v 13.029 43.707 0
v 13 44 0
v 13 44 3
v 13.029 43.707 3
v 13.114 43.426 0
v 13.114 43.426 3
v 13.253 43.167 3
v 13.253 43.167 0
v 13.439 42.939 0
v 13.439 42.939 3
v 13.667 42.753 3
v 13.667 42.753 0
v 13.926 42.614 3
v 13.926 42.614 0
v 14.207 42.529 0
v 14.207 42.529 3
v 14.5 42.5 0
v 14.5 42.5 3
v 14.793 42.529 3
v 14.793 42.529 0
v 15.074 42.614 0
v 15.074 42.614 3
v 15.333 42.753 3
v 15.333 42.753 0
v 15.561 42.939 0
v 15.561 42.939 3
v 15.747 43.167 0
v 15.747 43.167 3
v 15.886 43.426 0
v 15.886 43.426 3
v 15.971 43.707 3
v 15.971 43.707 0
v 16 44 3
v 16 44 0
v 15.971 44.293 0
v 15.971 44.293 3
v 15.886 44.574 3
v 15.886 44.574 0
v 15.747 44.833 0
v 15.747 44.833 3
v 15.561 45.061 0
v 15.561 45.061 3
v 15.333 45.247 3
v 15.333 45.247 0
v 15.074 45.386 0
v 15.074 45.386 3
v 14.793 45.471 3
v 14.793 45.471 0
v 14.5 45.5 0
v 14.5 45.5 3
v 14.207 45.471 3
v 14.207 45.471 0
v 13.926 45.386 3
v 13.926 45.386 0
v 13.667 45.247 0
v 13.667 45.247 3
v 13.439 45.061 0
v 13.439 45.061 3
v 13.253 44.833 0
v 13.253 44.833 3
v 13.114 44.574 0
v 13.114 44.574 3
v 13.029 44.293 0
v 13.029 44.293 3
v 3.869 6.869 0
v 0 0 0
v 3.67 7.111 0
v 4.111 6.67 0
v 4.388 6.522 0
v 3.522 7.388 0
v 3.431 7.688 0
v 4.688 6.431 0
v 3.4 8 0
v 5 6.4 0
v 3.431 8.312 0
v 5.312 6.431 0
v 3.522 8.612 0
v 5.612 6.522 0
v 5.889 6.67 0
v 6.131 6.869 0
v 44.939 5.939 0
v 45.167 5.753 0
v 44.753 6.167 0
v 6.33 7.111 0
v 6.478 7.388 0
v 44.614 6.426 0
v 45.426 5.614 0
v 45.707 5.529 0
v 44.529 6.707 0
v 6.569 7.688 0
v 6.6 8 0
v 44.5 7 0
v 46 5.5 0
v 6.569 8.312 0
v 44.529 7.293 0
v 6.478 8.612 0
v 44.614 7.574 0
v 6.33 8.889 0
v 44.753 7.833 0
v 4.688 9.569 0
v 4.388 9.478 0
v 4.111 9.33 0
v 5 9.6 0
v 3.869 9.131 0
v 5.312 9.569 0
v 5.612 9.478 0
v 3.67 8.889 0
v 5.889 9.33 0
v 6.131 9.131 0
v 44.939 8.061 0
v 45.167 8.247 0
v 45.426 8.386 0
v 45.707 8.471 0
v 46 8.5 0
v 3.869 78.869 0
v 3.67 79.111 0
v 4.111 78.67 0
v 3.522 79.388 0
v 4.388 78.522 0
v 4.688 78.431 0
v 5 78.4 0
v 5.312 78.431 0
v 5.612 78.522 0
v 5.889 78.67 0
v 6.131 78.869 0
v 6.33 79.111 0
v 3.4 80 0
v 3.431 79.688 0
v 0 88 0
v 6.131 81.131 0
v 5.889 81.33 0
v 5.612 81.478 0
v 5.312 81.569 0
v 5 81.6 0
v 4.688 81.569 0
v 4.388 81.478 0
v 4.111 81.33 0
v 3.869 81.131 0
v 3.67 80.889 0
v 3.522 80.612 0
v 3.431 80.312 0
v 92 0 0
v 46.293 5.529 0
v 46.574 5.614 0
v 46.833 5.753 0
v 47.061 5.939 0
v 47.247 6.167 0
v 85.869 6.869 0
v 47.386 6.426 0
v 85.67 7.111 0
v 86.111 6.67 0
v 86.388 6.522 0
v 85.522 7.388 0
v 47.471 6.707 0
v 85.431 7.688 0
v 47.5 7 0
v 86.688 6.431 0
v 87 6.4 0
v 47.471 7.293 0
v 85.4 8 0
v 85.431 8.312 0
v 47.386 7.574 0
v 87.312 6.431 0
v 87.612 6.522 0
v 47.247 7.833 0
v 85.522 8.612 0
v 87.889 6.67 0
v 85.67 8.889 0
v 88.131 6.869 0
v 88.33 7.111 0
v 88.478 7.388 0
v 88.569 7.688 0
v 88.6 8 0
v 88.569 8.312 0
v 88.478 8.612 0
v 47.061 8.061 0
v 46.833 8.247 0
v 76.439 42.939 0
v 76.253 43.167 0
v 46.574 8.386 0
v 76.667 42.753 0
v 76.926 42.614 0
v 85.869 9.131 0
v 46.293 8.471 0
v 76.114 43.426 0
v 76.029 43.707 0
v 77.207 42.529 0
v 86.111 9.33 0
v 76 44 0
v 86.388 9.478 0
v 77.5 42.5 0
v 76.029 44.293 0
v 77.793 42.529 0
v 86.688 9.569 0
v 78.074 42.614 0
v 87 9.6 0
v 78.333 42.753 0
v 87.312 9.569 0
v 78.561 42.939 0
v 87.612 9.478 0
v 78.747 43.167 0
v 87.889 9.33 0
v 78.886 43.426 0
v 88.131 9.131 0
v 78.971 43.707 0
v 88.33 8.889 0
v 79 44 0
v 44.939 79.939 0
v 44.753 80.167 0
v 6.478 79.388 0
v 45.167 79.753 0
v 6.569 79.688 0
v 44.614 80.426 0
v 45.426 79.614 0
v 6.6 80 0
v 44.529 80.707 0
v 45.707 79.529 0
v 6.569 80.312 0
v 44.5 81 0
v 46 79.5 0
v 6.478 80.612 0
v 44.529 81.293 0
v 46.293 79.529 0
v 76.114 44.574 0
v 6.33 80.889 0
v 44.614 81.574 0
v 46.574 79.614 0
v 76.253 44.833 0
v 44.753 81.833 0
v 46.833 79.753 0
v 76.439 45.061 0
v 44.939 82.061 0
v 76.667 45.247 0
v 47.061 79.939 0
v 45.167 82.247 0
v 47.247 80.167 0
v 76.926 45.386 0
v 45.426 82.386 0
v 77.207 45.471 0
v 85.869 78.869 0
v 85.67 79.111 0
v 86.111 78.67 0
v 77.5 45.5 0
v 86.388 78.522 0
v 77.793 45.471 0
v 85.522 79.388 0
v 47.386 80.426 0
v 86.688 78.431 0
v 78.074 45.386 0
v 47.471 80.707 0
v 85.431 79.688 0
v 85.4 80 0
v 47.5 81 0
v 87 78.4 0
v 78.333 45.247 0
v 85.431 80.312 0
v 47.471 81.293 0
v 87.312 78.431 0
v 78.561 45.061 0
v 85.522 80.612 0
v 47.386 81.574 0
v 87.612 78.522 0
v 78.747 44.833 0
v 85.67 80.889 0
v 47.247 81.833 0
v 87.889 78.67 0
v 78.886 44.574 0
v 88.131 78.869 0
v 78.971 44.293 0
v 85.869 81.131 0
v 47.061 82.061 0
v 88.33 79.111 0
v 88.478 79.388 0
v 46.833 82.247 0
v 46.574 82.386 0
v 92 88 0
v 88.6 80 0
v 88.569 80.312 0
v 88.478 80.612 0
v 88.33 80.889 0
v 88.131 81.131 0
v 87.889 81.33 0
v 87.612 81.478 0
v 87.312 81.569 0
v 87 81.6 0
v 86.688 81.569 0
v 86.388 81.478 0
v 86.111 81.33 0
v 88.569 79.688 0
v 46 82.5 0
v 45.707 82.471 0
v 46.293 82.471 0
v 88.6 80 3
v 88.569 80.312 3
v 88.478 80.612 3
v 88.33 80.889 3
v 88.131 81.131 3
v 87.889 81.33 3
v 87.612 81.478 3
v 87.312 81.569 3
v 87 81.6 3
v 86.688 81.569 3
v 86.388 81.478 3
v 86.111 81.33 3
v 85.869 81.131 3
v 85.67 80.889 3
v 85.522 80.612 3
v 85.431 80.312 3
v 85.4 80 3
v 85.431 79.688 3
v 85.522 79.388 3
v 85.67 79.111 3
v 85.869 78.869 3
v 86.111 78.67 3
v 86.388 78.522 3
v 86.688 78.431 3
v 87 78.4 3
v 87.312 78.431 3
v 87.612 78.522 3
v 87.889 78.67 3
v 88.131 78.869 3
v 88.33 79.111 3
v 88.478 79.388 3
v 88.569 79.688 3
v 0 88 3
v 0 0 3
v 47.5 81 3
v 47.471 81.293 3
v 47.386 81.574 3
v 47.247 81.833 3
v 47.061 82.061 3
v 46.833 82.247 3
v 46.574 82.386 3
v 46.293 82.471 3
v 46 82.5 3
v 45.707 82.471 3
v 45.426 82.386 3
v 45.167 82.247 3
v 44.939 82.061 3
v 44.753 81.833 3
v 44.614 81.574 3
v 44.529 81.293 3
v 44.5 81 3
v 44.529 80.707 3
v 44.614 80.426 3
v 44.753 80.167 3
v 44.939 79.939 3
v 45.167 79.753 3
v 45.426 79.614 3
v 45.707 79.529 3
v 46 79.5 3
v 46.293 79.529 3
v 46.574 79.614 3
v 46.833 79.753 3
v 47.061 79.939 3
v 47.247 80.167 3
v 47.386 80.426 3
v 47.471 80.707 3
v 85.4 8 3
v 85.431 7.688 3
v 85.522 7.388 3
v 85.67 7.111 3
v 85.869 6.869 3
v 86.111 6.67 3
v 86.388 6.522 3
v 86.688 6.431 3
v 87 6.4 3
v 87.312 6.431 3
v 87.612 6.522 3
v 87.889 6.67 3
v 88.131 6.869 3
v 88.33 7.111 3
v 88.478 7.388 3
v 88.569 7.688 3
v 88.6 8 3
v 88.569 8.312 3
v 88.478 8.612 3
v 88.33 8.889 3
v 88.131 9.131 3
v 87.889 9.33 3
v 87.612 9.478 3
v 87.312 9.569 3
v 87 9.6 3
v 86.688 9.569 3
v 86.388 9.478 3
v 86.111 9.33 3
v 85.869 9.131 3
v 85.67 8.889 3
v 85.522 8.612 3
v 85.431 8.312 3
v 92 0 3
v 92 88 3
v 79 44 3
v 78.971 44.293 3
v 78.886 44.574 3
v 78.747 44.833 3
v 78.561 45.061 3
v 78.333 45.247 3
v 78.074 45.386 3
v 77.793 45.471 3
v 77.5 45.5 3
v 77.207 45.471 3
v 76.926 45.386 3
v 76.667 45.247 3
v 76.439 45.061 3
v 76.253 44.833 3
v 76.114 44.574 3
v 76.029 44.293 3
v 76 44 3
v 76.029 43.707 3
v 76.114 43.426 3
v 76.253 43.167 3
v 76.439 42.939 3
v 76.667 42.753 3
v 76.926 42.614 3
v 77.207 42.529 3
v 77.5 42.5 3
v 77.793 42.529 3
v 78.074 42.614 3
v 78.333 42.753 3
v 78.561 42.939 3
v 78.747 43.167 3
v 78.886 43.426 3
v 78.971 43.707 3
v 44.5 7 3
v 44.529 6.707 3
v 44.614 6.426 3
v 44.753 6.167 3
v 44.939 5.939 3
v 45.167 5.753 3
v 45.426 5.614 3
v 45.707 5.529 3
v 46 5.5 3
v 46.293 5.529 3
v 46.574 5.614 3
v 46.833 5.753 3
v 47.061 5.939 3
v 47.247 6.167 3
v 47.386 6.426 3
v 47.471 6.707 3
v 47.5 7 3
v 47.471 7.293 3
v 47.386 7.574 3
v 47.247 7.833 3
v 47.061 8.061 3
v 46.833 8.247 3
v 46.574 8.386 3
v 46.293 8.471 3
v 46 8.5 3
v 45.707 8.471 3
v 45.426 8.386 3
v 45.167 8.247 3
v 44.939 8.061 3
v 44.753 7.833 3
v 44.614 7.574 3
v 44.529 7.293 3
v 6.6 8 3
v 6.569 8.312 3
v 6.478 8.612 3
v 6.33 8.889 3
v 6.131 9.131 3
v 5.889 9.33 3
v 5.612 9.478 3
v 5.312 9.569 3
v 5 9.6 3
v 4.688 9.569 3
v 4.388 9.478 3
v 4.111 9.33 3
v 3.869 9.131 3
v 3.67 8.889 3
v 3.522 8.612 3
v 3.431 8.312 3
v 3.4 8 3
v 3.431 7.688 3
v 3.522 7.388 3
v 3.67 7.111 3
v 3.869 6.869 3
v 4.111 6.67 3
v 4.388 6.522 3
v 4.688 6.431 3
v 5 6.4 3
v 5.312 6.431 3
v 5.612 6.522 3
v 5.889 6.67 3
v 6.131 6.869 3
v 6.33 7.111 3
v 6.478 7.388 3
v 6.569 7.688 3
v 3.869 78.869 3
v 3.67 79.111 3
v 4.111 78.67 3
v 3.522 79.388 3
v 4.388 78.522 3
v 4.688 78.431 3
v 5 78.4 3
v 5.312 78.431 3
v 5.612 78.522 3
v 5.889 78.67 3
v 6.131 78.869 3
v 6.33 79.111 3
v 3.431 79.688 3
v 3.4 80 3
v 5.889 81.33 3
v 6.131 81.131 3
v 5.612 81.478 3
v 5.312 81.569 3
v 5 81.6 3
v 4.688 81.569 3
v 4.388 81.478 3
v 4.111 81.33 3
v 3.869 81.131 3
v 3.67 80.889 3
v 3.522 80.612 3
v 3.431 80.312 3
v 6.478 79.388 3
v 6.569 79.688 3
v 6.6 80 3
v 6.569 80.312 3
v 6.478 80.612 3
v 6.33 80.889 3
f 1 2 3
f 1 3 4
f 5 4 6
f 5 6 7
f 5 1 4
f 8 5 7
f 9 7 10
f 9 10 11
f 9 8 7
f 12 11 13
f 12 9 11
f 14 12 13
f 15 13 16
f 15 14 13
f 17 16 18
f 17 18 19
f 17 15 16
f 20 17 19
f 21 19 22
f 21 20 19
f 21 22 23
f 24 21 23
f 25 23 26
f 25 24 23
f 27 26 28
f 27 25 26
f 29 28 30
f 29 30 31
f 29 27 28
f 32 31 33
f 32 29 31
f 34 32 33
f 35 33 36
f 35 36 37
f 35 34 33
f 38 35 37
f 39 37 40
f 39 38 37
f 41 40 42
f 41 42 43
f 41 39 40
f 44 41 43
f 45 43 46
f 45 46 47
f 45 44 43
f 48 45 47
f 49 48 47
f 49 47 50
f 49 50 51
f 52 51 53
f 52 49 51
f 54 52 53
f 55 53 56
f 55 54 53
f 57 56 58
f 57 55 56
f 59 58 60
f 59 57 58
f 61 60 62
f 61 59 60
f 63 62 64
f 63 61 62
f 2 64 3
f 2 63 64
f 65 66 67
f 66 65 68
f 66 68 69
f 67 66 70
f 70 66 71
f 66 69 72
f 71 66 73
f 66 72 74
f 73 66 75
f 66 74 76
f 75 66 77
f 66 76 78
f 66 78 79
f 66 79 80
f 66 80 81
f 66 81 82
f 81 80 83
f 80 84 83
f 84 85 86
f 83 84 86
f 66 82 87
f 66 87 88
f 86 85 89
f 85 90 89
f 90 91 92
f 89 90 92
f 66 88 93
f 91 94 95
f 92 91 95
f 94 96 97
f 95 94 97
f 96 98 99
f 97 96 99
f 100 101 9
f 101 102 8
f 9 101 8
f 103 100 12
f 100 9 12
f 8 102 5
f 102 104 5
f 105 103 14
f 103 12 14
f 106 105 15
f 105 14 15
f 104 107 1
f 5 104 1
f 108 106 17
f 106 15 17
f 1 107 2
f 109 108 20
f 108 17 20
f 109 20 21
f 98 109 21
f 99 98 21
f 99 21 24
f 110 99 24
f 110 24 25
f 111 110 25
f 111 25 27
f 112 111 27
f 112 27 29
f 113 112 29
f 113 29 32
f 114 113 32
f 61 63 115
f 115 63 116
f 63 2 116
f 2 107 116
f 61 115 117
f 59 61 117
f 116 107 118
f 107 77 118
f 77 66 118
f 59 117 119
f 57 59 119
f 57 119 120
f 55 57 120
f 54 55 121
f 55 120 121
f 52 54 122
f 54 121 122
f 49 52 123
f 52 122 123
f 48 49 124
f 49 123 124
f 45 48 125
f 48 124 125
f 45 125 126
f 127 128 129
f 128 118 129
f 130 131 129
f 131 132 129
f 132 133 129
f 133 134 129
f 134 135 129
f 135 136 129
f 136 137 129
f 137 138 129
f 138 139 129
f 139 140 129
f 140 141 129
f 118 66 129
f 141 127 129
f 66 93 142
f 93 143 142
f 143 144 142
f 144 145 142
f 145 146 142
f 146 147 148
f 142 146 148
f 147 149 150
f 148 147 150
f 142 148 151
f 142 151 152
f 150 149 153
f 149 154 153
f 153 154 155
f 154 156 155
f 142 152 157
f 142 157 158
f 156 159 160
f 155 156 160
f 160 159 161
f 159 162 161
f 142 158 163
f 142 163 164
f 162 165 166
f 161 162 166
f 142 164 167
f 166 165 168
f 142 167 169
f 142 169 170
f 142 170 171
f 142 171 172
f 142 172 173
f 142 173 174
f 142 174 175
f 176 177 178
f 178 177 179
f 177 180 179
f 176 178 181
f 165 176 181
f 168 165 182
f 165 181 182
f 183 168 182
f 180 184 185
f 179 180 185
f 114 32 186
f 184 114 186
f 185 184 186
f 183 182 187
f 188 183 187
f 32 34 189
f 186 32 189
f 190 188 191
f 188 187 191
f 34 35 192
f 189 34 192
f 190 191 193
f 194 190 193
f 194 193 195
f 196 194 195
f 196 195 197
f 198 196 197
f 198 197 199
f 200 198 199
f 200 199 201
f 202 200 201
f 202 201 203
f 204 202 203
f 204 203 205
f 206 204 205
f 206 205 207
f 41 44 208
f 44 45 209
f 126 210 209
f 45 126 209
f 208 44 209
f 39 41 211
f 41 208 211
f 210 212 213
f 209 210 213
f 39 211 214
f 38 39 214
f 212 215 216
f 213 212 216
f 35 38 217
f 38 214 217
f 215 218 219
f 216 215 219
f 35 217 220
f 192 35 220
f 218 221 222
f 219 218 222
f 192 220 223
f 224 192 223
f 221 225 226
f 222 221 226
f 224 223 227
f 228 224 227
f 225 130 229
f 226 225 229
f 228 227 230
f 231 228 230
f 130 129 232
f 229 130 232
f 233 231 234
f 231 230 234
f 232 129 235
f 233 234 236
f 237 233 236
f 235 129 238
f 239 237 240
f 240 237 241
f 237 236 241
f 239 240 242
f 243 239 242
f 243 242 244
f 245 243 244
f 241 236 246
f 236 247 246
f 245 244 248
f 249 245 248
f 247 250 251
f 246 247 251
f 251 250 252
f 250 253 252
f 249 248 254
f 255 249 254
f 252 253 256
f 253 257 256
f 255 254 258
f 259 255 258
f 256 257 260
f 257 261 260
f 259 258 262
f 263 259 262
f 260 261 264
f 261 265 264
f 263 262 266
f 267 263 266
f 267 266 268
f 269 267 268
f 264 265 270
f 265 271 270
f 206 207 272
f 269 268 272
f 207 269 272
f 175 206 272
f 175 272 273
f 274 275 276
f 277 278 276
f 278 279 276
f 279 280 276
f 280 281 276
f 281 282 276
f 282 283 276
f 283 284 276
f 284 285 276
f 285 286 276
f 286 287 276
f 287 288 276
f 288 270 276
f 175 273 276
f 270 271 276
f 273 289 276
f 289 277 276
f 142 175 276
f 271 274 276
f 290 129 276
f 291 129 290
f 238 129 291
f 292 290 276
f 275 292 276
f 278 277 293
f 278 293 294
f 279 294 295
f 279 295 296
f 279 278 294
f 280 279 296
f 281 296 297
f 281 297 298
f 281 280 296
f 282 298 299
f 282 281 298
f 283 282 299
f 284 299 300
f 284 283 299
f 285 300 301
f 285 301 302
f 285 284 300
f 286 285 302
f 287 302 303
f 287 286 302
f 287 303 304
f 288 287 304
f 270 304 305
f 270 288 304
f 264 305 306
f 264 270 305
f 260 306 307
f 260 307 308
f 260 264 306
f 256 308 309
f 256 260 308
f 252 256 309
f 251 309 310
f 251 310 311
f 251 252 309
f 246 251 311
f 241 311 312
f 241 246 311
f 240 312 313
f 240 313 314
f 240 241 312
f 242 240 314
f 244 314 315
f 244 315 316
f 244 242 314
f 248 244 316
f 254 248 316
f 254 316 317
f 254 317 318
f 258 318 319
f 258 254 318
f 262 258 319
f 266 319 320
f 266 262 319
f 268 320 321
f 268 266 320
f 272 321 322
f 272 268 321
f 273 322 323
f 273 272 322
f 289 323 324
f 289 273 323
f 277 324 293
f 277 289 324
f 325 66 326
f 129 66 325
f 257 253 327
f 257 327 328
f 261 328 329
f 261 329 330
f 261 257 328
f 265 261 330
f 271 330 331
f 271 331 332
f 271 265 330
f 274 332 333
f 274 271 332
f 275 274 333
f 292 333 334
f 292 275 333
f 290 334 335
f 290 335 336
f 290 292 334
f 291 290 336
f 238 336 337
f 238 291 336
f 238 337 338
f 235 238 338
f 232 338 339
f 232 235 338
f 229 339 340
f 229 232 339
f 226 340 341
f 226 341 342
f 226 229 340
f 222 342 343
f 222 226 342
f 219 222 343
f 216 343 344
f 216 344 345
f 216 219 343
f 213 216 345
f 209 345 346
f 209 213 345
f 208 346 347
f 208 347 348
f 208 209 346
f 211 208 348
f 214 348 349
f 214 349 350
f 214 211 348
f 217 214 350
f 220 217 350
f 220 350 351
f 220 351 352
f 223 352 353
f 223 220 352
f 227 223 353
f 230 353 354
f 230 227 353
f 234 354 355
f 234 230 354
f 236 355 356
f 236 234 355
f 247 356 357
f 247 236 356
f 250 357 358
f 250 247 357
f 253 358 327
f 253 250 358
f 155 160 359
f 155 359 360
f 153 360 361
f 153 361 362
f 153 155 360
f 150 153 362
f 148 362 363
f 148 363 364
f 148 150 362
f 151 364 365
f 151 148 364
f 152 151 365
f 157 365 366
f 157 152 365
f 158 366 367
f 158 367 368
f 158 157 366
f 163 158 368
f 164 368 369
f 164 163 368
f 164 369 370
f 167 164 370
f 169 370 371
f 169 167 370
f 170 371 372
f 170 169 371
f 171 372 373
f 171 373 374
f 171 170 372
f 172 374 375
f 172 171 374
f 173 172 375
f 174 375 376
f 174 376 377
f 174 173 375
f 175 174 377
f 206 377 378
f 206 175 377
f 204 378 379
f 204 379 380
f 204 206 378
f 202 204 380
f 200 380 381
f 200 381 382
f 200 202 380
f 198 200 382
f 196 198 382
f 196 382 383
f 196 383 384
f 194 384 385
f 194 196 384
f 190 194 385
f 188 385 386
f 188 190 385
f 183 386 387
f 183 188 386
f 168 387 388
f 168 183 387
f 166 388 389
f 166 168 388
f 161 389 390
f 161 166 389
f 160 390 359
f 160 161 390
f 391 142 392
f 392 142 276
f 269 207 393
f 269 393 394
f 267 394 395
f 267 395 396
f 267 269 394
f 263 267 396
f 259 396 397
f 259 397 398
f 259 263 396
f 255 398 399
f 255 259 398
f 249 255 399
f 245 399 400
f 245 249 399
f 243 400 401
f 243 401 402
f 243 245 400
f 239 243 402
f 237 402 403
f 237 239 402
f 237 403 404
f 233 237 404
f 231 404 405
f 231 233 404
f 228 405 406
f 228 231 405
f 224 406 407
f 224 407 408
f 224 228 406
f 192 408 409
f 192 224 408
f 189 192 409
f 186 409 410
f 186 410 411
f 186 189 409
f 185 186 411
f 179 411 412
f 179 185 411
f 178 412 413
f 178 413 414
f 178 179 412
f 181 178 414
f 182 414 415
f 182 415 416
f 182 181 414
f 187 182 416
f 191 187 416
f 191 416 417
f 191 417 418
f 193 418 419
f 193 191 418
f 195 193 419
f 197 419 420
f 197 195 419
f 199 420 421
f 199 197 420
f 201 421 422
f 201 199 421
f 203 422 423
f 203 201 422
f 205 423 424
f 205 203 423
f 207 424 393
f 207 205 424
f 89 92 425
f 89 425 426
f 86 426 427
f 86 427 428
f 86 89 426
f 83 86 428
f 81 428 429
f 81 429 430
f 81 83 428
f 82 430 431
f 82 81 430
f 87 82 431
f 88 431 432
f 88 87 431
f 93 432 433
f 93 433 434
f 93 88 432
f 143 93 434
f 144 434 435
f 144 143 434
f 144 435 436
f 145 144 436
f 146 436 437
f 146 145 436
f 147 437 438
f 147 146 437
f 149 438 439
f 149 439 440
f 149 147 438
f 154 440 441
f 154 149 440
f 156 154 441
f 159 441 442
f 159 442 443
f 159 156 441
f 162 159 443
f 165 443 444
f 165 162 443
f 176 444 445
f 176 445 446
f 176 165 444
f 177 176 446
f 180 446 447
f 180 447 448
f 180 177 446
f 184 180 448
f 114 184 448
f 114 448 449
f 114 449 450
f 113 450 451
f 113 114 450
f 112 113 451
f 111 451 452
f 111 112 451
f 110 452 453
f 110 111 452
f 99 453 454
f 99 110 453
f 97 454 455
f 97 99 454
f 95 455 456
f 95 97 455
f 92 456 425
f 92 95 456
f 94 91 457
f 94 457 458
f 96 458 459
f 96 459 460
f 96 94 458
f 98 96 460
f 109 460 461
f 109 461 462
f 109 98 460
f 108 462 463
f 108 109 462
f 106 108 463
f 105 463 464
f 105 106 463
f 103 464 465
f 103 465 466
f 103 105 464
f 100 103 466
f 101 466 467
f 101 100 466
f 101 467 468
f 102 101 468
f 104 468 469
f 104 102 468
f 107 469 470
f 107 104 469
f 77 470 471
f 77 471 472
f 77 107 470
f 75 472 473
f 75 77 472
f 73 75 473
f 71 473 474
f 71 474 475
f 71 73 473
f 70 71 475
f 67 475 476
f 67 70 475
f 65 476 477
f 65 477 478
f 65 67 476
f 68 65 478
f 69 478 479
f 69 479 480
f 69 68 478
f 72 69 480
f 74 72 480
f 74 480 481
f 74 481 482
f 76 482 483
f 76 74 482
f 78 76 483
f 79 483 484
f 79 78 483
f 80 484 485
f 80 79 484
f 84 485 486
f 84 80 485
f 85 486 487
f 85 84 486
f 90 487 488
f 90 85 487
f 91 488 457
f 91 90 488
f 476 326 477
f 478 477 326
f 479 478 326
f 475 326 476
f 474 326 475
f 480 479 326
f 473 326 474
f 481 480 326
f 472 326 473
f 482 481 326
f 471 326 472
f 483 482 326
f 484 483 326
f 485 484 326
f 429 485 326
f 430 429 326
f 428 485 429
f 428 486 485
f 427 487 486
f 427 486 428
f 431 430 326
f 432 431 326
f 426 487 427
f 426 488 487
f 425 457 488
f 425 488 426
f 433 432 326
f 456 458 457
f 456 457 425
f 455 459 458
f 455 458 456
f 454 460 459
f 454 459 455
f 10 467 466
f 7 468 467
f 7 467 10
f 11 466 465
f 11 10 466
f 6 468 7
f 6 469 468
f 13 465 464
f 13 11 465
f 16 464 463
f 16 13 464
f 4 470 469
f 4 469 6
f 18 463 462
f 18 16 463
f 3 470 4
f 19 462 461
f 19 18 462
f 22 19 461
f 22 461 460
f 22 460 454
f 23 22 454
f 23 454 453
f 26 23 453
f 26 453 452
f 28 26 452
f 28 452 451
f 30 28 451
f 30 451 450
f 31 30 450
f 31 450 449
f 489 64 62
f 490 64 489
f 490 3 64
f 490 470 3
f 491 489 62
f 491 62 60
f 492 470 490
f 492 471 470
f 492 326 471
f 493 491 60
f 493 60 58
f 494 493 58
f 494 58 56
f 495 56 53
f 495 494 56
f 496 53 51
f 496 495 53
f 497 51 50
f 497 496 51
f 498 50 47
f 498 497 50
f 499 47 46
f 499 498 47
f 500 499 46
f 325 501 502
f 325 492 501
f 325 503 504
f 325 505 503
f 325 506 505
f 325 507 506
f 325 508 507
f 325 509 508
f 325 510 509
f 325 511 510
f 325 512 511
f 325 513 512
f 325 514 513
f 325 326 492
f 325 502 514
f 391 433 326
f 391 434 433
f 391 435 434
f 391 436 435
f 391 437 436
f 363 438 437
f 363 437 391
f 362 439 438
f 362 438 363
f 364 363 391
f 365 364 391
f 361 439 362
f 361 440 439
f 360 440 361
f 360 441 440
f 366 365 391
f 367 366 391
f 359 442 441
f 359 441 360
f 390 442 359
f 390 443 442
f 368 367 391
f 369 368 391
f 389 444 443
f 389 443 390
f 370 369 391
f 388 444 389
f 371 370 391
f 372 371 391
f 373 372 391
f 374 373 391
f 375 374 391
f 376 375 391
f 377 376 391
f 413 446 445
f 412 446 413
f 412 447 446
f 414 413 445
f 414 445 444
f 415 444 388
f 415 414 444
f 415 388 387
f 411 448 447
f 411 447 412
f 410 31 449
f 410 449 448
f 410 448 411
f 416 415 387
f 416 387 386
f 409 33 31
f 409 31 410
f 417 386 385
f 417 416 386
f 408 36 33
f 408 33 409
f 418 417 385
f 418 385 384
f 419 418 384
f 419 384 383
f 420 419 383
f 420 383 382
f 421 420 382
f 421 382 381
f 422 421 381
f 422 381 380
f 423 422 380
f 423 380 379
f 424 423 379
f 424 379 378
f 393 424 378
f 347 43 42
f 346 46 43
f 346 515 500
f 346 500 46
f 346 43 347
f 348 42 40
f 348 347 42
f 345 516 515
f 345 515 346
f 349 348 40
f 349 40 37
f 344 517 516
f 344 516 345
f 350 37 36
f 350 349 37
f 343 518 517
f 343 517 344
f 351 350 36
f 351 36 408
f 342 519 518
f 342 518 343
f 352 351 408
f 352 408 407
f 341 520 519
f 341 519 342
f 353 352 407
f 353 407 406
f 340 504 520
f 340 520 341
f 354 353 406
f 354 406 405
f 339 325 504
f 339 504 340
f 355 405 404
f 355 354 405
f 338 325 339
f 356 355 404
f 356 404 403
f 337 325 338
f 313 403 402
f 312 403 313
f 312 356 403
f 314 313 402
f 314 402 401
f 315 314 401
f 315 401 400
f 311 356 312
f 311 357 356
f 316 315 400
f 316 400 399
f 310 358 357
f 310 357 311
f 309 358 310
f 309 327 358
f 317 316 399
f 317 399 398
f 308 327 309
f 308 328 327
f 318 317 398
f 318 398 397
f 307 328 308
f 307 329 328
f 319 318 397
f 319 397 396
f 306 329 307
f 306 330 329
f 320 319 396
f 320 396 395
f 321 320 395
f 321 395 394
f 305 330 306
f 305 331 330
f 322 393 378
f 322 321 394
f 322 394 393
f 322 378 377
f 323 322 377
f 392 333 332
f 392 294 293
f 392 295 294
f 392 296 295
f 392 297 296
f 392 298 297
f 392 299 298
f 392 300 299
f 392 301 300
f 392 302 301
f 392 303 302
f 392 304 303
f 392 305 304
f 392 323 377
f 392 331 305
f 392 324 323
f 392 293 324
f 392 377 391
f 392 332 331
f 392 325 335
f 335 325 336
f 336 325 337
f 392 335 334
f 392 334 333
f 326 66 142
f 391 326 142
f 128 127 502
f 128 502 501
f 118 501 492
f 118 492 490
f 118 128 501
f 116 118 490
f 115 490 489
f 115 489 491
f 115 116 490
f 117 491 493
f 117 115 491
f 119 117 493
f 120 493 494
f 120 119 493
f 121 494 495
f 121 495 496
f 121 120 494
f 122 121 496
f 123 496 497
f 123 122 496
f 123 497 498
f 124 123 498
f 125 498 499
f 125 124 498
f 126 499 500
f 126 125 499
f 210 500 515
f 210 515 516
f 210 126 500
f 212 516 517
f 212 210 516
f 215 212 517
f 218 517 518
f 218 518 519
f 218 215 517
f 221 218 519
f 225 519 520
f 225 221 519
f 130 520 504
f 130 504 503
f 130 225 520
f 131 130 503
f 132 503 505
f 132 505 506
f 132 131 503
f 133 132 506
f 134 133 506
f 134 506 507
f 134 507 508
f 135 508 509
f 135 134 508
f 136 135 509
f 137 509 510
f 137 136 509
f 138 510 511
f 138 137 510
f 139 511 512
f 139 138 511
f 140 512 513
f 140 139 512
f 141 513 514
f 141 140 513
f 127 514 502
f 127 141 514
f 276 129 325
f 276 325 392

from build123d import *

# Parameters (mm, degrees)
SKETCH_1_W      = 92
SKETCH_1_H      = 88
SKETCH_1_R      = 1.6
SKETCH_1_R_2    = 1.5
EXTRUDE_1_DEPTH = 3


with BuildPart() as part:
    # 草图1 → 凸台-拉伸1 (new body)
    with BuildSketch(Plane.XY):
        with Locations((46, 44)):
            Rectangle(SKETCH_1_W, SKETCH_1_H)
        with Locations((5, 8)):
            Circle(SKETCH_1_R, mode=Mode.SUBTRACT)
        with Locations(Location((5, 80, 0), (0, 0, 180))):
            Circle(SKETCH_1_R, mode=Mode.SUBTRACT)
        with Locations(Location((87, 8, 0), (0, 0, 180))):
            Circle(SKETCH_1_R, mode=Mode.SUBTRACT)
        with Locations((87, 80)):
            Circle(SKETCH_1_R, mode=Mode.SUBTRACT)
        with Locations((46, 81)):
            Circle(SKETCH_1_R_2, mode=Mode.SUBTRACT)
        with Locations((77.5, 44)):
            Circle(SKETCH_1_R_2, mode=Mode.SUBTRACT)
        with Locations(Location((46, 7, 0), (0, 0, 180))):
            Circle(SKETCH_1_R_2, mode=Mode.SUBTRACT)
        with Locations(Location((14.5, 44, 0), (0, 0, 180))):
            Circle(SKETCH_1_R_2, mode=Mode.SUBTRACT)
    extrude(amount=EXTRUDE_1_DEPTH)


solid = part.part
